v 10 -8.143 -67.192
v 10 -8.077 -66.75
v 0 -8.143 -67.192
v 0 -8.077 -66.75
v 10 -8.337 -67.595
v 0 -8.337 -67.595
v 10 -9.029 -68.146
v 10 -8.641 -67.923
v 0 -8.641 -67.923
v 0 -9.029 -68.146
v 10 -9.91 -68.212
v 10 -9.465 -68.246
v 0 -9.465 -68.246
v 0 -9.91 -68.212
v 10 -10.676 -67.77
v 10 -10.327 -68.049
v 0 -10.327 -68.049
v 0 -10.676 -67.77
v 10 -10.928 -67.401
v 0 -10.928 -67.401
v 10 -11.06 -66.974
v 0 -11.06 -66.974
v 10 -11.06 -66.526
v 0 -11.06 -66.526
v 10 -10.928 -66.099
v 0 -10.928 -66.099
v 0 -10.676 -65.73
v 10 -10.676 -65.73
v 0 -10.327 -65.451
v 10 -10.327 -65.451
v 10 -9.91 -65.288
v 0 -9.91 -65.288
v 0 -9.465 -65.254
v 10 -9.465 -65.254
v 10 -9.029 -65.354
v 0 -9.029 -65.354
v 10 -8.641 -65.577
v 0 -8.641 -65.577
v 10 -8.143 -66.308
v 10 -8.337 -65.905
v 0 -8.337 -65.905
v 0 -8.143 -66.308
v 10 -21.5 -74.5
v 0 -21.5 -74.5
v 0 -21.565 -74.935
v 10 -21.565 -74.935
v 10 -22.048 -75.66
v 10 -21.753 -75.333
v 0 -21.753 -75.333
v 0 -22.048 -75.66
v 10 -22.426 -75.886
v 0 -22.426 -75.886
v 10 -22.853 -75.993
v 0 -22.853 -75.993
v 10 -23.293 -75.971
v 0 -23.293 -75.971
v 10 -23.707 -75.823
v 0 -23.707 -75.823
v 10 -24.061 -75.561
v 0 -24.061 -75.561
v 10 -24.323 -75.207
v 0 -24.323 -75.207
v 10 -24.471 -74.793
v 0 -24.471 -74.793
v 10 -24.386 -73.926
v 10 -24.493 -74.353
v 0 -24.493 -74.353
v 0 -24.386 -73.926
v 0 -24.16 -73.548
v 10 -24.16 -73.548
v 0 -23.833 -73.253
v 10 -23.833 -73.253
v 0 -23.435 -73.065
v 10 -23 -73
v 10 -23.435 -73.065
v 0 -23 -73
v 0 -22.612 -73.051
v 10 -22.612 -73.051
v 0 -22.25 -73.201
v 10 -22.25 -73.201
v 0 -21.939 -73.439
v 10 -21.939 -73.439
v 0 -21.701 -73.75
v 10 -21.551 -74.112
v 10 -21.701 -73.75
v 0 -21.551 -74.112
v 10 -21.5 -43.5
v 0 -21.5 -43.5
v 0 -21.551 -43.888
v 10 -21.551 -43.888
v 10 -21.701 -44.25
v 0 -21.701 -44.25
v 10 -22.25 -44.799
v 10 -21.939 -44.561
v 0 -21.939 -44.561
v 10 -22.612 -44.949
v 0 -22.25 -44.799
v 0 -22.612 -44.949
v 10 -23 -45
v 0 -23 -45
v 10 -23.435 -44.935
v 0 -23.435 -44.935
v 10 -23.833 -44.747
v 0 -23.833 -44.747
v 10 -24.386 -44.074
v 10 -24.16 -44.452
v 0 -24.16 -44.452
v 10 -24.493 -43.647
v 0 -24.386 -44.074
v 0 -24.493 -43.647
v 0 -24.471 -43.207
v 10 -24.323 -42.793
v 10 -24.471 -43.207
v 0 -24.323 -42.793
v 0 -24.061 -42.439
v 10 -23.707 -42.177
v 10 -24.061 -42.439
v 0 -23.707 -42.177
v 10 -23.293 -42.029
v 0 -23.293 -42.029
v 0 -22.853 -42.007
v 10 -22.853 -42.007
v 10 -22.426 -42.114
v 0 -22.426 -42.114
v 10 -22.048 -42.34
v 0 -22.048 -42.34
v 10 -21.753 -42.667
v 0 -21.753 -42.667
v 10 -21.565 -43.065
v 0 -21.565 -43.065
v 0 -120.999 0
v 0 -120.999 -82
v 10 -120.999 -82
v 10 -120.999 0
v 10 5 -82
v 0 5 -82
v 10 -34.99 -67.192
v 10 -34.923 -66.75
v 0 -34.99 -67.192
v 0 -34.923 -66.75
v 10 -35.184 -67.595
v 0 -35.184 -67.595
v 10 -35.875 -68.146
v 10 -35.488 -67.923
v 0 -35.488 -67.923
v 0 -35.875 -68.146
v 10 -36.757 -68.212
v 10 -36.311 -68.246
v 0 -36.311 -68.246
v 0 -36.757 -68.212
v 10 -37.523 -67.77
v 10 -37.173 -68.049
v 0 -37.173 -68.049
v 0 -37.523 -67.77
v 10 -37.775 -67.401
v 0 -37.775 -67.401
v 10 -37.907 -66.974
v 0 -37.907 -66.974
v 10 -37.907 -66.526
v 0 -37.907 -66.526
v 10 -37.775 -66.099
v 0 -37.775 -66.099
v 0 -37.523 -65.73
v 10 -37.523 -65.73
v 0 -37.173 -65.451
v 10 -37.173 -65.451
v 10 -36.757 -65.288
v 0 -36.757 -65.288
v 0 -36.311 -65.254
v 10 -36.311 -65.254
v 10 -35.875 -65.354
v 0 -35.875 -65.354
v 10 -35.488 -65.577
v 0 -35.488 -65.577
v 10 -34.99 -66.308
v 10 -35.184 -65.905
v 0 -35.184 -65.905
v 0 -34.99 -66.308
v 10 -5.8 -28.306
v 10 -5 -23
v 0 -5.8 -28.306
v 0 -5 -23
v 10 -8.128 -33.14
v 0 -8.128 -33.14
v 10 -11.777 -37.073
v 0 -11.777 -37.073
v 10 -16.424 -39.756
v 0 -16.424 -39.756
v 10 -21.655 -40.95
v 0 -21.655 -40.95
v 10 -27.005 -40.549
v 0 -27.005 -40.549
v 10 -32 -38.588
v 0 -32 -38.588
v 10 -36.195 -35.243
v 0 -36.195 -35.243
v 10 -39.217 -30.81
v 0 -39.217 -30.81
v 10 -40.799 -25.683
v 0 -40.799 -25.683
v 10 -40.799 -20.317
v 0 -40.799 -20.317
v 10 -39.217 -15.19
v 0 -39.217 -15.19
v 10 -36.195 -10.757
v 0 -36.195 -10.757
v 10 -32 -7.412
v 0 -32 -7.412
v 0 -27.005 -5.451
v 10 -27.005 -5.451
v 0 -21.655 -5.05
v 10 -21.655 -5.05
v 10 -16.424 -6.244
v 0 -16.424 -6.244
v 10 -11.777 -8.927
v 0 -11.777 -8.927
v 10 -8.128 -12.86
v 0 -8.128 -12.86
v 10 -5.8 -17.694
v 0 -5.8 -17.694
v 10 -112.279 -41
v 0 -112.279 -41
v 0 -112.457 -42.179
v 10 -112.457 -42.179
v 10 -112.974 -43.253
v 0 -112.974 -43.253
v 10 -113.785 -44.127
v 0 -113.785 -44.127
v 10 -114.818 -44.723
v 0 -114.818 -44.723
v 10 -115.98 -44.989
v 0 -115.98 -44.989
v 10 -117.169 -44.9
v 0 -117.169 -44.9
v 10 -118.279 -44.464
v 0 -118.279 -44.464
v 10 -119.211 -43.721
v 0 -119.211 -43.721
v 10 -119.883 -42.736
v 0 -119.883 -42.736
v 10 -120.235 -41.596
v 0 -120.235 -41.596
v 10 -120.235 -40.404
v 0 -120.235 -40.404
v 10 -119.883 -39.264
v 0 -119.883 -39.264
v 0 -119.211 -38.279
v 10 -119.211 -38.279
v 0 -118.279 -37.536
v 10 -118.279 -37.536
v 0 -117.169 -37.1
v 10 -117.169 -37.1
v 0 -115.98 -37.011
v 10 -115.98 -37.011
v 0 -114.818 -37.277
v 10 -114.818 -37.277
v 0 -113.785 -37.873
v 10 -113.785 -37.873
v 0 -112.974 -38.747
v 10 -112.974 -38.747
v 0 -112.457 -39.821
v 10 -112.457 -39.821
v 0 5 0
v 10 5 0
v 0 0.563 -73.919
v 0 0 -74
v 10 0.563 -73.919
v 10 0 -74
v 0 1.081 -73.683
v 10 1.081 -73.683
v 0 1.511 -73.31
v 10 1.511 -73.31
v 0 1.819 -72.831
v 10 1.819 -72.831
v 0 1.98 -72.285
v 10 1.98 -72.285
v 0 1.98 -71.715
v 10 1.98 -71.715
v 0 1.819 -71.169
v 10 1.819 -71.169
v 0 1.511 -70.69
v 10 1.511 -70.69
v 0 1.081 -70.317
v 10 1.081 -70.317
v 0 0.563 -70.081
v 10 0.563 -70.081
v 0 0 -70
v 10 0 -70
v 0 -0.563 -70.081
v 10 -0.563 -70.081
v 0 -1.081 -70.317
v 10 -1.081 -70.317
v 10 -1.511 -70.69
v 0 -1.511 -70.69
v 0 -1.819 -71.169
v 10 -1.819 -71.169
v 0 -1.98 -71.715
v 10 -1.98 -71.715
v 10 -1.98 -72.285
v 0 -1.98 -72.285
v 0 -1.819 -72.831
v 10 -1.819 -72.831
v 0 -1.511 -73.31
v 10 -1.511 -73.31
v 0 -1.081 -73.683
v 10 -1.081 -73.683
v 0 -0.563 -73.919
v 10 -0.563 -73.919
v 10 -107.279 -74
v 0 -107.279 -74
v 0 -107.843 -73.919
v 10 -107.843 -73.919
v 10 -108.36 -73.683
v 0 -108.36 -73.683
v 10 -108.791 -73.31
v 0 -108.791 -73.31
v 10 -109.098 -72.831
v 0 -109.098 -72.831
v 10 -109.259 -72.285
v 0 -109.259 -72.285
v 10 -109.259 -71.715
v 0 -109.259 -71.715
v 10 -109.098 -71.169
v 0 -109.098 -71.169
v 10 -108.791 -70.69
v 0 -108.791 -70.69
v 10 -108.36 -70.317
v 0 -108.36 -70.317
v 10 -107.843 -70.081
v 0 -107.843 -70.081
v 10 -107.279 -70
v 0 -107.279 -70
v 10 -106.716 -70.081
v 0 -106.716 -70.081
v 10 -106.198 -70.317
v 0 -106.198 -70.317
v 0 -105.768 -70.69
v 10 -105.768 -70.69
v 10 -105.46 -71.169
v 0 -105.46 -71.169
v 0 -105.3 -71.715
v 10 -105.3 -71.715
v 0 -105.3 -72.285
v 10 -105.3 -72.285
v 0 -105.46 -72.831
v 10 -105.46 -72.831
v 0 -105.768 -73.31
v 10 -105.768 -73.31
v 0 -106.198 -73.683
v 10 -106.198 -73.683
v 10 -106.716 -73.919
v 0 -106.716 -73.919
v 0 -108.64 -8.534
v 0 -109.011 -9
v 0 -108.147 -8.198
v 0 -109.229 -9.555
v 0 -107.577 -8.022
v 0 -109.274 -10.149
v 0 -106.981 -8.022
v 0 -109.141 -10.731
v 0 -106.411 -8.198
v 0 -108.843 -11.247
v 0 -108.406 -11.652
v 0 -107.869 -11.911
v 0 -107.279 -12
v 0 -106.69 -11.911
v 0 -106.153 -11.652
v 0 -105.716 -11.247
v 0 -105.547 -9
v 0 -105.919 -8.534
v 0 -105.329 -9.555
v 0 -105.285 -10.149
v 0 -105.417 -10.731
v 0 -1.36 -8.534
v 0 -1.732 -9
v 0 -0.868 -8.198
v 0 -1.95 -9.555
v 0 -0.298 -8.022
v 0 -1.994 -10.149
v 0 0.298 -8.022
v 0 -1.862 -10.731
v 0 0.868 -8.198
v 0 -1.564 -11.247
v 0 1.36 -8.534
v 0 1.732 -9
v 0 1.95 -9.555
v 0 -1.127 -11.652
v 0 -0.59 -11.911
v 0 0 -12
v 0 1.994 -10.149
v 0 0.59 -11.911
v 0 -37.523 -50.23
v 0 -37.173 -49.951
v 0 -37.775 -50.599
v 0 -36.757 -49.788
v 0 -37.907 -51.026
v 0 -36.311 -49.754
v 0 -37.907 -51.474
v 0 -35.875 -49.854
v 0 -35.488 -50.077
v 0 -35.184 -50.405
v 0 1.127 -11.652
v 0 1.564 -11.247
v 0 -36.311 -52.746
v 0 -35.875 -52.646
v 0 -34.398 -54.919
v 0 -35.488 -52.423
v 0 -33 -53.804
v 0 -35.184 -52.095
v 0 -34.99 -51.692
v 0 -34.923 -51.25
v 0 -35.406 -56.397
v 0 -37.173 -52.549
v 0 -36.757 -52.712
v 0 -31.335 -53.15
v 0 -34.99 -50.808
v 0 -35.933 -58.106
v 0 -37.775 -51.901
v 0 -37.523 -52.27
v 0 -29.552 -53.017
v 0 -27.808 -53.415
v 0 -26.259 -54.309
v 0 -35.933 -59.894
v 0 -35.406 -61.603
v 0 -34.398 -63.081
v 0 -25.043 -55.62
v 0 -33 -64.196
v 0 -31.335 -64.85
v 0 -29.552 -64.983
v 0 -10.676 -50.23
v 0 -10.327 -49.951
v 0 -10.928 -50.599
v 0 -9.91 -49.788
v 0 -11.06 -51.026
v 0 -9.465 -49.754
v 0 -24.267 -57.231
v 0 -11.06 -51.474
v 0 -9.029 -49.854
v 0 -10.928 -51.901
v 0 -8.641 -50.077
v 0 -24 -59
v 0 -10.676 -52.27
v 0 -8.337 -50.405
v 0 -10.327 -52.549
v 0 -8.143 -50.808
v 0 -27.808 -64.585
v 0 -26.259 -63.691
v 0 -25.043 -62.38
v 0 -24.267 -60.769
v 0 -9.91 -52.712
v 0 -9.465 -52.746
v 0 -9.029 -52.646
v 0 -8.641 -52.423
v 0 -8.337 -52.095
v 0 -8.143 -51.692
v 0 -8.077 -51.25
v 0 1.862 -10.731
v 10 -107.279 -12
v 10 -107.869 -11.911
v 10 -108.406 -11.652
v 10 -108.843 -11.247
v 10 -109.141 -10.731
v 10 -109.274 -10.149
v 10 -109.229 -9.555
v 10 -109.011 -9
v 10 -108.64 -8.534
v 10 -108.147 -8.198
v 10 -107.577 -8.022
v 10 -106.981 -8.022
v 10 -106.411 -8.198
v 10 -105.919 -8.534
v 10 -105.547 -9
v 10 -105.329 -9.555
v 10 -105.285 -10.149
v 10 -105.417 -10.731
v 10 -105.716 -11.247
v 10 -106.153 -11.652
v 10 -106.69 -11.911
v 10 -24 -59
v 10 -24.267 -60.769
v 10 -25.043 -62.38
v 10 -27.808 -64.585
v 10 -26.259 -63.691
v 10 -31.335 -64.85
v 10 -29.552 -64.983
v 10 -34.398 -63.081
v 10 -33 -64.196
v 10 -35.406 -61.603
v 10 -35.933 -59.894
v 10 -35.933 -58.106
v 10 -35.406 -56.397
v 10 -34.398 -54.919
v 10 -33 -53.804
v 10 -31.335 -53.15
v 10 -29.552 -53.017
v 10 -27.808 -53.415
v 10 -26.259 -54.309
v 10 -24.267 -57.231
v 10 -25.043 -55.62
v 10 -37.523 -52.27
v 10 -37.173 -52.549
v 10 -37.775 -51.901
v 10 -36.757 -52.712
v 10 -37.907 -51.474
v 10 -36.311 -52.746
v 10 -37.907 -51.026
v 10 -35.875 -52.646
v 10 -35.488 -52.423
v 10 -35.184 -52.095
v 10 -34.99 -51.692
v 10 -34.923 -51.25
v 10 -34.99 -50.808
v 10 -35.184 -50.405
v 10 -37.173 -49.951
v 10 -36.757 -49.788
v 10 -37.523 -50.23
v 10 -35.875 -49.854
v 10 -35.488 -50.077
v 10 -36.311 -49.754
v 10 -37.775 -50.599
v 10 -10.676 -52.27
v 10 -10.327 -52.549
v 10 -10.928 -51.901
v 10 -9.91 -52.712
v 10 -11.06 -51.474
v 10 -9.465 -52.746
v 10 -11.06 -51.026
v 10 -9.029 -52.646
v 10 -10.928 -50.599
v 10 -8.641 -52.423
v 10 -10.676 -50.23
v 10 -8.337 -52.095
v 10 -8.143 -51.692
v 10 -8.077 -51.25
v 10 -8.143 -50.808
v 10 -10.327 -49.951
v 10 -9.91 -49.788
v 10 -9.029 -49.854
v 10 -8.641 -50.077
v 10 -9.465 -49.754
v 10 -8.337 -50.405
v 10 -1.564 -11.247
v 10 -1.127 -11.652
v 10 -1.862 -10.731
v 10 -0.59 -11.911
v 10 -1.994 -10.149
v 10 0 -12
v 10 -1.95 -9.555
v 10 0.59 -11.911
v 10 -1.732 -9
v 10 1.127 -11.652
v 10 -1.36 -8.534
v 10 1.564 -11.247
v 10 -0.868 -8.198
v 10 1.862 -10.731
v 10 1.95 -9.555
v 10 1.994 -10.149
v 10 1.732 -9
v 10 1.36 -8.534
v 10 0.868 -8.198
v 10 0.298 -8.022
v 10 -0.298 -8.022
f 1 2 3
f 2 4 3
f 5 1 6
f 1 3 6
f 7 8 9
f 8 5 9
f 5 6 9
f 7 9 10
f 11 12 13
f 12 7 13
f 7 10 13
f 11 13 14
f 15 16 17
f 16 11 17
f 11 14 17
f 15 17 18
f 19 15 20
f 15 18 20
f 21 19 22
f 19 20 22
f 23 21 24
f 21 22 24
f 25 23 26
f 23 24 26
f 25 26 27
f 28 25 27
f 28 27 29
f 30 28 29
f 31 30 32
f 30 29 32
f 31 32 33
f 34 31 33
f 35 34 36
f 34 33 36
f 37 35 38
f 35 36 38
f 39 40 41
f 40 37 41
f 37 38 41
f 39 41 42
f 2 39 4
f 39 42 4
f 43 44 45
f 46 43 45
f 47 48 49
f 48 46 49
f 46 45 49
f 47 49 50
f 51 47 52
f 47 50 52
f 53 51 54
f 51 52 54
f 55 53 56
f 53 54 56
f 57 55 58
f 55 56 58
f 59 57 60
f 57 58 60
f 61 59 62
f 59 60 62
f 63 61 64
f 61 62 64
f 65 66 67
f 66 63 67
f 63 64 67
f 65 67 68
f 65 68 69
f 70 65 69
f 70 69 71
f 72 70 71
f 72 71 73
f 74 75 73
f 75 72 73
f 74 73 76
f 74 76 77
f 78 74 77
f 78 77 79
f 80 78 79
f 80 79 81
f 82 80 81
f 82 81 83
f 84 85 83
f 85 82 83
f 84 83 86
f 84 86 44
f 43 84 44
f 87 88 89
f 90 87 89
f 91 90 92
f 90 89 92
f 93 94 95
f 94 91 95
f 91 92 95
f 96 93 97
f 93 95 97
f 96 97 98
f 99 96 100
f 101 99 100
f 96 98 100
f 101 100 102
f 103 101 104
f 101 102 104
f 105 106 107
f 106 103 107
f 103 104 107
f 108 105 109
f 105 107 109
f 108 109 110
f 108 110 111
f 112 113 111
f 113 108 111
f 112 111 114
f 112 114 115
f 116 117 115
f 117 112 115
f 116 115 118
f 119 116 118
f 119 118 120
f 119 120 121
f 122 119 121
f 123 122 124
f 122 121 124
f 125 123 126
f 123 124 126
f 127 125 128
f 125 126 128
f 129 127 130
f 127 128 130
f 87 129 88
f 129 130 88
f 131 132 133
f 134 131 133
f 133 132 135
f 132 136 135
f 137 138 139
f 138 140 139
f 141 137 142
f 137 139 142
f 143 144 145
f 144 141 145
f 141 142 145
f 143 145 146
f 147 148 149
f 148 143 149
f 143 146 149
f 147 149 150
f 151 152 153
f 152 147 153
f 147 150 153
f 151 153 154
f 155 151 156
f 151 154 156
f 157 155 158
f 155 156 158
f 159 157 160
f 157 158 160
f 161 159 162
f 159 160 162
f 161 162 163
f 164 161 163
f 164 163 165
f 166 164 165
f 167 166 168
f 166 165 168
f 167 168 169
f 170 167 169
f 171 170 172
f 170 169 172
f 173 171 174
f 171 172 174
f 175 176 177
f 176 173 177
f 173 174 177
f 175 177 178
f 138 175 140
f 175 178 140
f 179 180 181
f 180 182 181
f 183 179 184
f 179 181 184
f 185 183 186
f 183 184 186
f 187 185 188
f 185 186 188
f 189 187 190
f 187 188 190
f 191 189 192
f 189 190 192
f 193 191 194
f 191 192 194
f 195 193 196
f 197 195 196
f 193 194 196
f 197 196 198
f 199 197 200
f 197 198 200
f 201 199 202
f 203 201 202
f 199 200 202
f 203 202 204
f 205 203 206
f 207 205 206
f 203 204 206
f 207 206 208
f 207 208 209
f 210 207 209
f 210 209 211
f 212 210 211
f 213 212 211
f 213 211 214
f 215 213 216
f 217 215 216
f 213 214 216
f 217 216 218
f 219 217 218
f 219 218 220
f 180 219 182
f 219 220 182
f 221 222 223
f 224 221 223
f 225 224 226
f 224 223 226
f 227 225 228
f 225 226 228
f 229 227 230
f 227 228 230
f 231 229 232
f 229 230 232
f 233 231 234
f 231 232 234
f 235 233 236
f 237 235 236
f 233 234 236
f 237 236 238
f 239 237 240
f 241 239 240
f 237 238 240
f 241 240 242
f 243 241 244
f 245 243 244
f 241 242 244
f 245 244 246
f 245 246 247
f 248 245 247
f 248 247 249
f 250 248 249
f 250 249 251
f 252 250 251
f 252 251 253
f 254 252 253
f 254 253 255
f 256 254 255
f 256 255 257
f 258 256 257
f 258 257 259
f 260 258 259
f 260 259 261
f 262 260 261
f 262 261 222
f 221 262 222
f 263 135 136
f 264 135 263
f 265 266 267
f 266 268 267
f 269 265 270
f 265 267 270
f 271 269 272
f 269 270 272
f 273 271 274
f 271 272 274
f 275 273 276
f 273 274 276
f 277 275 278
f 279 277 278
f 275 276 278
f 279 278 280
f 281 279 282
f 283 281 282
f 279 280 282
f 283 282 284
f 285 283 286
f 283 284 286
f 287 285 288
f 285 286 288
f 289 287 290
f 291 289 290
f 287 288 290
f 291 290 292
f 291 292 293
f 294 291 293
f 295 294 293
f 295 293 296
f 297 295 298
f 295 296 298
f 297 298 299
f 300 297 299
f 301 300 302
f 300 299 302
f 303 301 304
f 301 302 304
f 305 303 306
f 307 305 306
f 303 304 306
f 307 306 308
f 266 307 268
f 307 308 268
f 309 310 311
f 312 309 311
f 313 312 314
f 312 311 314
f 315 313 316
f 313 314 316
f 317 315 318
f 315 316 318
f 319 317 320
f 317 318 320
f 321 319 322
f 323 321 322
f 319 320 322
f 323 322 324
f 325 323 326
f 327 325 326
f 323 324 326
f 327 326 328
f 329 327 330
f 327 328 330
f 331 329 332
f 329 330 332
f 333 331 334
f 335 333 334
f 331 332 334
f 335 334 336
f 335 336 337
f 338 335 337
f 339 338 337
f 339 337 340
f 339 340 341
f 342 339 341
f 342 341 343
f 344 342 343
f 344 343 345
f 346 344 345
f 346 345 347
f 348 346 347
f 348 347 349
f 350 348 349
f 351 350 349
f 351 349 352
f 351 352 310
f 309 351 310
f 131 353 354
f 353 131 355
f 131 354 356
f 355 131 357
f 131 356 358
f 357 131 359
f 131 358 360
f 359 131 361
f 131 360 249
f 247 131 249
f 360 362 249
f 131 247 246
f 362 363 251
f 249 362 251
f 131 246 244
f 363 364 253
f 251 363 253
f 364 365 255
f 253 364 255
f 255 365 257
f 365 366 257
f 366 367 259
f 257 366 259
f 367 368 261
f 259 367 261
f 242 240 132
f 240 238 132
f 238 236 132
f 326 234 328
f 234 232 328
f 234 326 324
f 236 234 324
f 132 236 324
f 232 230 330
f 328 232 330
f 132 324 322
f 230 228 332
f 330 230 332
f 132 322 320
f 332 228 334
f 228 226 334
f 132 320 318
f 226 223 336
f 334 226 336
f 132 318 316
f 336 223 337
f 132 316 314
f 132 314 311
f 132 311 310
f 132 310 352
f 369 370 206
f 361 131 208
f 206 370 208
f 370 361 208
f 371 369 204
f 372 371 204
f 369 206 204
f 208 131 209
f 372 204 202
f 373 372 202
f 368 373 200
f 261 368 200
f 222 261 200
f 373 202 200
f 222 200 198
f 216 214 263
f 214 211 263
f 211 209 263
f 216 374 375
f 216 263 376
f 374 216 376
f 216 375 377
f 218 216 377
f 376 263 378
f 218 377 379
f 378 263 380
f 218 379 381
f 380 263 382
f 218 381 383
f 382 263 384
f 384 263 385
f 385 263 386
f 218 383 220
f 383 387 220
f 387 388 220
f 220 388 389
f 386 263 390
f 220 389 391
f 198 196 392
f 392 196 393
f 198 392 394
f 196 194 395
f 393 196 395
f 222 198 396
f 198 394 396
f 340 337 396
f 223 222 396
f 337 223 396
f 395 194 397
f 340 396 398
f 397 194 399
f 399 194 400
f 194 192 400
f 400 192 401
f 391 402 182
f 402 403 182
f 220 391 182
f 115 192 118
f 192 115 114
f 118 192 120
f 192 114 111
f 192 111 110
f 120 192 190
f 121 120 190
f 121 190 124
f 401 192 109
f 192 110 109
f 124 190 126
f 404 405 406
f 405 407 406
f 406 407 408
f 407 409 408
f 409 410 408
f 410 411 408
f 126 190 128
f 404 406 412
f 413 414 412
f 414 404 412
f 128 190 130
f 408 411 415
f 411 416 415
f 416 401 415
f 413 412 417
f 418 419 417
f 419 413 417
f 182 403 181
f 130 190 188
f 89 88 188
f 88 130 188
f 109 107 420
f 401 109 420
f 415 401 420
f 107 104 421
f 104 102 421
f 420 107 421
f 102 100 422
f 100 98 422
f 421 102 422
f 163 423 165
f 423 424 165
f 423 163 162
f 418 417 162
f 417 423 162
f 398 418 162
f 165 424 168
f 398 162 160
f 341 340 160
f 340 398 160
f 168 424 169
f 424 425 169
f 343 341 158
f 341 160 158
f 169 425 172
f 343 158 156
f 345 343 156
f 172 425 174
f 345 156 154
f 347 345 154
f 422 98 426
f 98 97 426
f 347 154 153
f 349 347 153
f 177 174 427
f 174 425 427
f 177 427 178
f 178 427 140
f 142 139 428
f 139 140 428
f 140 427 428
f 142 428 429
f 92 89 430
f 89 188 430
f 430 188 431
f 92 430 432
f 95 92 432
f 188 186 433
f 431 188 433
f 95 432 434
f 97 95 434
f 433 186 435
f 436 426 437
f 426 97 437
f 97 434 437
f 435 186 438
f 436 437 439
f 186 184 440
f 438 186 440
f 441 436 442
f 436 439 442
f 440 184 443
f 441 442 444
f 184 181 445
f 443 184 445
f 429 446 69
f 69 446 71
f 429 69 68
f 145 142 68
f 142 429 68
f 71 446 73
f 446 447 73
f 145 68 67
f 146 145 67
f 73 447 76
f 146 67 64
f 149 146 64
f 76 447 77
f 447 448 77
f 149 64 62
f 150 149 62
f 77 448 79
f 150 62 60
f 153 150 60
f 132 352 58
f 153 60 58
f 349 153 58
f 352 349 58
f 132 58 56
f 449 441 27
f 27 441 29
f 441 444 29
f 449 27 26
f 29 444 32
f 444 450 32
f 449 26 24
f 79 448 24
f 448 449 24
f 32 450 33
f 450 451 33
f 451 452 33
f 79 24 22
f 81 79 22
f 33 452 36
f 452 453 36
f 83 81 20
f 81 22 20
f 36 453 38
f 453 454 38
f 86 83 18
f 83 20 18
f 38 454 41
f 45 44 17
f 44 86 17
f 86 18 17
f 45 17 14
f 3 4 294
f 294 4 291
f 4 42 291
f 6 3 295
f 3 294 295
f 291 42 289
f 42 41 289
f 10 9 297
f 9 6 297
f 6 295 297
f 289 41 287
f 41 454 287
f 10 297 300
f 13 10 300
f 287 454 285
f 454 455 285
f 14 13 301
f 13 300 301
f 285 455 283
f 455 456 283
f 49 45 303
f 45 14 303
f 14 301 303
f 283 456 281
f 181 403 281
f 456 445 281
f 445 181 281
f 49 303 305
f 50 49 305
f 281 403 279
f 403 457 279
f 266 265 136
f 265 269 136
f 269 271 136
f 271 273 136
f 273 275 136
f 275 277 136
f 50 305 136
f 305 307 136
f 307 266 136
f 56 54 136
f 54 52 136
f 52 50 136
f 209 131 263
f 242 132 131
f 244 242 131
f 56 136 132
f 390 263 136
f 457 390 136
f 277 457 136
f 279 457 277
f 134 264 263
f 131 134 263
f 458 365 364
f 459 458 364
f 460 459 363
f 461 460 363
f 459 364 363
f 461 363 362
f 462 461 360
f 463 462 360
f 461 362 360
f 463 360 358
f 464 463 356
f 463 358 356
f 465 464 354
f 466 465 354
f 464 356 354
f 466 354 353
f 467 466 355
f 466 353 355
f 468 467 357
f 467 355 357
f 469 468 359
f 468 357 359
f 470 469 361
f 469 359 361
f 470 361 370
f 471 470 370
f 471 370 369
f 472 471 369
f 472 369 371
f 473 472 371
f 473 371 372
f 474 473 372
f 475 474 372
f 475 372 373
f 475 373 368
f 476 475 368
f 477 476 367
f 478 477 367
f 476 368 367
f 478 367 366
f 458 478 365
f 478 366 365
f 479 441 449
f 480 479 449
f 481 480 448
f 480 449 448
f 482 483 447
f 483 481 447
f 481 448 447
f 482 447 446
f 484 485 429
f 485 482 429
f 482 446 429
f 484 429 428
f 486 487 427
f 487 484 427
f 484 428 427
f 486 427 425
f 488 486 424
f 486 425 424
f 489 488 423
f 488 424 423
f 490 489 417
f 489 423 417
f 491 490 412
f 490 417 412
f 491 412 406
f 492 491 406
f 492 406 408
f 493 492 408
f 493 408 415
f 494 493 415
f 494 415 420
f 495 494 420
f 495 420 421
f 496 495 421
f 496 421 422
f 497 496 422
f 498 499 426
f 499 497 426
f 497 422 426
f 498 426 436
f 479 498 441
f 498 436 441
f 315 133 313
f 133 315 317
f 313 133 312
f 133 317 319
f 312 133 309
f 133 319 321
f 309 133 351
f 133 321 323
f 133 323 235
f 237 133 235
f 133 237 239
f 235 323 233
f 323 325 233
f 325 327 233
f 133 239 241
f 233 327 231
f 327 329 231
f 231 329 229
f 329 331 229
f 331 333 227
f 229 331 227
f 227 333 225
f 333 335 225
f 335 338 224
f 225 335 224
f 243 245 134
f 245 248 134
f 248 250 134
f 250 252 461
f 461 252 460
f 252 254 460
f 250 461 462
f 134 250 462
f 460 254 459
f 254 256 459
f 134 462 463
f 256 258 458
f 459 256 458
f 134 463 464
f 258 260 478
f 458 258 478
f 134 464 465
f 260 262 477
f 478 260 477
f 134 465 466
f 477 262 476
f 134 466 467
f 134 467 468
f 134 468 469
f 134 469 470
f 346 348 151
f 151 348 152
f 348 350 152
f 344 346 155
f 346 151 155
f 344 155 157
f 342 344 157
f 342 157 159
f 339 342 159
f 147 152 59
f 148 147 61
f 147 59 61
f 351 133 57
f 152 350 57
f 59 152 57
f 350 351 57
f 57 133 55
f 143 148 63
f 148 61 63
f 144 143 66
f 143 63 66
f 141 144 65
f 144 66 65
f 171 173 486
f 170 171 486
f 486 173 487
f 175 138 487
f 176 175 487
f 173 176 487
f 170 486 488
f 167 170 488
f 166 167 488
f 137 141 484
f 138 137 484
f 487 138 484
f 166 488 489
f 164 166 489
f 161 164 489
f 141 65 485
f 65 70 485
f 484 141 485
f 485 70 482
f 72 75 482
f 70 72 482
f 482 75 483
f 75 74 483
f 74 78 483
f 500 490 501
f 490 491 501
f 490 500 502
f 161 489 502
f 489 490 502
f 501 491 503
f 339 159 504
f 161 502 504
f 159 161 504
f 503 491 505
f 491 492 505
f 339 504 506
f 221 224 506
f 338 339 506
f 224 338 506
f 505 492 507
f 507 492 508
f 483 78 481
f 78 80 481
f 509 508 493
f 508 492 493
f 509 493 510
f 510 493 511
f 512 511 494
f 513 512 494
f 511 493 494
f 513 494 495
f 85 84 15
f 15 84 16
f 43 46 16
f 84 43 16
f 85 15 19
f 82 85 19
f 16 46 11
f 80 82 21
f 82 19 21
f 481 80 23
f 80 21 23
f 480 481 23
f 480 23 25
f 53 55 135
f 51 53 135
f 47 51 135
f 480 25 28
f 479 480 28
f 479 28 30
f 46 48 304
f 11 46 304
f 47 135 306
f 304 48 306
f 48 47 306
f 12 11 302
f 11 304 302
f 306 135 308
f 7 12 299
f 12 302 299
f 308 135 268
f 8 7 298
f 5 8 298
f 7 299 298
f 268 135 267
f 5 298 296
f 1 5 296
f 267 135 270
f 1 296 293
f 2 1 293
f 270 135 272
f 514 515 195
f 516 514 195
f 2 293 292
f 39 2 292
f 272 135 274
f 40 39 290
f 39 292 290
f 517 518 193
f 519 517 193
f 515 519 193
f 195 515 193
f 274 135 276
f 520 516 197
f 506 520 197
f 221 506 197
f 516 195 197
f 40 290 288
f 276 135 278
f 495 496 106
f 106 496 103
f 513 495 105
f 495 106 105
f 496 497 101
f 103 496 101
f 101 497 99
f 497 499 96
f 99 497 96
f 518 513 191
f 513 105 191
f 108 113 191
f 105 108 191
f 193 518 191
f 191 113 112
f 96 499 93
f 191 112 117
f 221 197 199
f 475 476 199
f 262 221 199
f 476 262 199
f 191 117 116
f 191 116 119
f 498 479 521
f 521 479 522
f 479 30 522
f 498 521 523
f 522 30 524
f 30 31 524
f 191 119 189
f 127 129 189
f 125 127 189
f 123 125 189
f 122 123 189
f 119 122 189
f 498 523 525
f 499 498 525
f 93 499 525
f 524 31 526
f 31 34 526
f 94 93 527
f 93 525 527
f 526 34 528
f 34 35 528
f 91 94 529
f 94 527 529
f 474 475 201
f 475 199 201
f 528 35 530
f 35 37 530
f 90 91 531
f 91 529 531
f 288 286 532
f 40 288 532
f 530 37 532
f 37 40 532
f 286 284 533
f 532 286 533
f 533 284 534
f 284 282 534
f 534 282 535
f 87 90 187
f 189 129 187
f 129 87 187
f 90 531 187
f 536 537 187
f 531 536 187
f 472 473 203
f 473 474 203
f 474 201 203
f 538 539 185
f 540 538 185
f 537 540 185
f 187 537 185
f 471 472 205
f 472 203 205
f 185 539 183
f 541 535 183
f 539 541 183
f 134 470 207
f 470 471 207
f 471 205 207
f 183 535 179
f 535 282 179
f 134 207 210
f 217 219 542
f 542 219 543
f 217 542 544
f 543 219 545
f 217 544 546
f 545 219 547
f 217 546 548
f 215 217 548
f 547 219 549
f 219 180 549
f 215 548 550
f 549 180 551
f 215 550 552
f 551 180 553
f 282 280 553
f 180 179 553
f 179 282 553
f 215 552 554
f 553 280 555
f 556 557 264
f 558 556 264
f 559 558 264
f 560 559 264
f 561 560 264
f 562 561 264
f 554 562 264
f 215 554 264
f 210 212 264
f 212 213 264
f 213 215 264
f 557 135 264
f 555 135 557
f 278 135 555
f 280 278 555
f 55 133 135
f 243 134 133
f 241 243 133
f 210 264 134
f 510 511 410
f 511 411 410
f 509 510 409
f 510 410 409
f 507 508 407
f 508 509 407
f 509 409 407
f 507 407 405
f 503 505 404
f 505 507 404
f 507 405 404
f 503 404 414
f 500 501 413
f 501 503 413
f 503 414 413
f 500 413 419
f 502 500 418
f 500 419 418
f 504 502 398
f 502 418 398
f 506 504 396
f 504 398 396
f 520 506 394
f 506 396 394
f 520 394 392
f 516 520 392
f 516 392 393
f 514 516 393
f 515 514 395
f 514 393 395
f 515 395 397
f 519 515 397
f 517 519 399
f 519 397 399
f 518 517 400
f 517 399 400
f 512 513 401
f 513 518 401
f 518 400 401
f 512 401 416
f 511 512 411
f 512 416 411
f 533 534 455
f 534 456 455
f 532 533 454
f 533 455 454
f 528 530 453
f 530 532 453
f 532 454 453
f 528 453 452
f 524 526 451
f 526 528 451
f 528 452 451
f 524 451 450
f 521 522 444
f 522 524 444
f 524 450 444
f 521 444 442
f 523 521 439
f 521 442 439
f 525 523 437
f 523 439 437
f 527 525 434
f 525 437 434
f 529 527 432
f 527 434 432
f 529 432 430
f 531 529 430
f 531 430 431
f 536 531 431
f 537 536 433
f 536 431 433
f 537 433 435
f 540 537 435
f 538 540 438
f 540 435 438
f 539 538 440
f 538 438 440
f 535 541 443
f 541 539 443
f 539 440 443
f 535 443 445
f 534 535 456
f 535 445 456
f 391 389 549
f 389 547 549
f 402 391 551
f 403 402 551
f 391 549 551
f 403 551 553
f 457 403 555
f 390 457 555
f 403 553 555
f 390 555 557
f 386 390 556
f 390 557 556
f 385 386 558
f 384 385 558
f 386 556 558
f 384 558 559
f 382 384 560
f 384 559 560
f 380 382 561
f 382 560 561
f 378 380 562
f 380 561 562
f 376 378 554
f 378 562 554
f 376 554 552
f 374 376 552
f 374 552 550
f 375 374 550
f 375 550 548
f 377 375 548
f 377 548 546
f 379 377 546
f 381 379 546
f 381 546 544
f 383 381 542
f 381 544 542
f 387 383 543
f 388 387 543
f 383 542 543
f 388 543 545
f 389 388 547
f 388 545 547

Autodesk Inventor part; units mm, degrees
ref_plane "YZ Plane" through (0, 0, 0) normal (1, 0, 0) x (0, 1, 0)
ref_plane "XZ Plane" through (0, 0, 0) normal (0, 1, 0) x (-1, 0, 0)
ref_plane "XY Plane" through (0, 0, 0) normal (0, 0, 1) x (1, 0, 0)
sketch "Esquisse1" plane through (0, 0, 0) normal (1, 0, 0) x (0, 1, 0)
  line L0 (0, 0) -> (-126, 0)
  line L1 (-126, -82) -> (0, -82)
  circle A0 centre (-23, -23) radius 18
  circle A1 centre (-23, -59) radius 18
  circle A2 centre (-116.2792, -41) radius 4
  line L2 (-120.2792, 0) -> (-120.2792, -82)
  circle A3 centre (-30, -59) radius 6
  circle A4 centre (-23, -43.5) radius 1.5
  circle A5 centre (-23, -74.5) radius 1.5
  circle A6 centre (-9.5766, -51.25) radius 1.5
  circle A7 centre (-9.5766, -66.75) radius 1.5
  line L3 (-23, -59) -> (-30, -59)
  line L4 (-23, -59) -> (-23, -43.5)
  line L5 (-23, -59) -> (-23, -74.5)
  circle A8 centre (-36.4234, -51.25) radius 1.5
  circle A9 centre (-36.4234, -66.75) radius 1.5
  line L6 (0, -82) -> (5, -82)
  line L7 (5, -82) -> (5, 0)
  line L8 (5, 0) -> (0, 0)
  line L9 (-5, -82) -> (-5, 0)
  line L10 (0, -72) -> (0, -10)
  circle A10 centre (0, -72) radius 2
  circle A11 centre (0, -10) radius 2
  line L11 (5, 0) -> (0, 0)
  line L12 (5, -82) -> (-5, -82)
  line L13 (-107.2792, -10) -> (-107.2792, -72)
  circle A12 centre (-107.2792, -10) radius 2
  circle A13 centre (-107.2792, -72) radius 2
  line L14 (-120.2792, 0) -> (-126, 0)
  line L15 (-126, 0) -> (-126, -82)
  line L16 (-126, -82) -> (-120.2792, -82)
  line L17 (-120.2792, -82) -> (-120.2792, 0)
  dimension "d0" = 82
  dimension "d2" = 36
  dimension "d3" = 23
  dimension "d4" = 36
  dimension "d5" = 23
  dimension "d6" = 8
  dimension "d7" = 95
  dimension "d8" = 41
  dimension "d12" = 4
  dimension "d13" = 12
  dimension "d14" = 7
  dimension "d15" = 3
  dimension "d16" = 15.5
  dimension "d17" = 3
  dimension "d18" = 15.5
  dimension "d19" = 3
  dimension "d20" = 3
  dimension "d21" = 60
  dimension "d22" = 60
  dimension "d23" = 15.5
  dimension "d25" = 0
  dimension "d26" = 15.5
  dimension "d27" = 3
  dimension "d28" = 3
  dimension "d29" = 15.5
  dimension "d30" = 15.5
  dimension "d31" = 60
  dimension "d32" = 60
  dimension "d38" = 82
  dimension "d39" = 28
  dimension "d40" = 10
  dimension "d41" = 5
  dimension "d42" = 62
  dimension "d43" = 10
  dimension "d44" = 4
  dimension "d45" = 4
  dimension "d46" = 5
  dimension "d47" = 82
  dimension "d48" = 10
  dimension "d49" = 28
  dimension "d61" = 62
  dimension "d62" = 13
  dimension "d63" = 10
  dimension "d64" = 4
  dimension "d65" = 4
  dimension "d76" = 126
  dimension "d77" = 126
extrude "Extrusion1" add sketch "Esquisse1" along normal blind 10 contours L9 A0 A1 L1 L2 L0 | L9 A1 A0 | A1 | A13 | A12
sketch "Esquisse2" plane through (10, -23, -23) normal (1, 0, 0) x (0, 0, -1)
  line L0 (0, 18) -> (-23, 18) projected
  line L1 (-23, 18) -> (59, 18)
  line L2 (59, 18) -> (59, 28)
  line L3 (59, 28) -> (-23, 28)
  line L4 (-23, 28) -> (-23, 18)
  line L5 (-13, 23) -> (49, 23)
  circle A0 centre (-13, 23) radius 2
  circle A1 centre (49, 23) radius 2
  point P0 (-23, 23)
  dimension "d52" = 82
  dimension "d53" = 10
  dimension "d54" = 62
  dimension "d55" = 10
  dimension "d56" = 4
  dimension "d57" = 4
  dimension "d58" = 5
extrude "Extrusion2" add sketch "Esquisse2" against normal blind 10
sketch "Esquisse3" plane through (10, -116.2792, -41) normal (1, 0, 0) x (0, 0, -1)
  line L0 (-31, 9) -> (31, 9)
  line L1 (-41, 121.2792) -> (-41, -4) projected
  line L2 (-41, -4) -> (0, -4) projected
  point P0 (-41, 116.2792)
  dimension "d66" = 62
  dimension "d67" = 10
  dimension "d68" = 13
hole "Perçage1" at (10, -107.2792, -10) at (10, -107.2792, -72) direction (-1, 0, 0) diameter 4 end through all
sketch "Esquisse4" plane through (0, -120.2792, -41) normal (0, -1, 0) x (1, 0, 0)
  line L0 (0, 0) -> (0, -41) projected
  line L1 (10, 41) -> (0, 41)
  line L2 (0, 41) -> (0, -41)
  line L3 (0, -41) -> (10, -41)
  line L4 (10, -41) -> (10, 41)
  dimension "d78" = 10
  dimension "d79" = 82
extrude "Extrusion3" add sketch "Esquisse4" along normal blind 0.72
properties part number "paroismoteur"
